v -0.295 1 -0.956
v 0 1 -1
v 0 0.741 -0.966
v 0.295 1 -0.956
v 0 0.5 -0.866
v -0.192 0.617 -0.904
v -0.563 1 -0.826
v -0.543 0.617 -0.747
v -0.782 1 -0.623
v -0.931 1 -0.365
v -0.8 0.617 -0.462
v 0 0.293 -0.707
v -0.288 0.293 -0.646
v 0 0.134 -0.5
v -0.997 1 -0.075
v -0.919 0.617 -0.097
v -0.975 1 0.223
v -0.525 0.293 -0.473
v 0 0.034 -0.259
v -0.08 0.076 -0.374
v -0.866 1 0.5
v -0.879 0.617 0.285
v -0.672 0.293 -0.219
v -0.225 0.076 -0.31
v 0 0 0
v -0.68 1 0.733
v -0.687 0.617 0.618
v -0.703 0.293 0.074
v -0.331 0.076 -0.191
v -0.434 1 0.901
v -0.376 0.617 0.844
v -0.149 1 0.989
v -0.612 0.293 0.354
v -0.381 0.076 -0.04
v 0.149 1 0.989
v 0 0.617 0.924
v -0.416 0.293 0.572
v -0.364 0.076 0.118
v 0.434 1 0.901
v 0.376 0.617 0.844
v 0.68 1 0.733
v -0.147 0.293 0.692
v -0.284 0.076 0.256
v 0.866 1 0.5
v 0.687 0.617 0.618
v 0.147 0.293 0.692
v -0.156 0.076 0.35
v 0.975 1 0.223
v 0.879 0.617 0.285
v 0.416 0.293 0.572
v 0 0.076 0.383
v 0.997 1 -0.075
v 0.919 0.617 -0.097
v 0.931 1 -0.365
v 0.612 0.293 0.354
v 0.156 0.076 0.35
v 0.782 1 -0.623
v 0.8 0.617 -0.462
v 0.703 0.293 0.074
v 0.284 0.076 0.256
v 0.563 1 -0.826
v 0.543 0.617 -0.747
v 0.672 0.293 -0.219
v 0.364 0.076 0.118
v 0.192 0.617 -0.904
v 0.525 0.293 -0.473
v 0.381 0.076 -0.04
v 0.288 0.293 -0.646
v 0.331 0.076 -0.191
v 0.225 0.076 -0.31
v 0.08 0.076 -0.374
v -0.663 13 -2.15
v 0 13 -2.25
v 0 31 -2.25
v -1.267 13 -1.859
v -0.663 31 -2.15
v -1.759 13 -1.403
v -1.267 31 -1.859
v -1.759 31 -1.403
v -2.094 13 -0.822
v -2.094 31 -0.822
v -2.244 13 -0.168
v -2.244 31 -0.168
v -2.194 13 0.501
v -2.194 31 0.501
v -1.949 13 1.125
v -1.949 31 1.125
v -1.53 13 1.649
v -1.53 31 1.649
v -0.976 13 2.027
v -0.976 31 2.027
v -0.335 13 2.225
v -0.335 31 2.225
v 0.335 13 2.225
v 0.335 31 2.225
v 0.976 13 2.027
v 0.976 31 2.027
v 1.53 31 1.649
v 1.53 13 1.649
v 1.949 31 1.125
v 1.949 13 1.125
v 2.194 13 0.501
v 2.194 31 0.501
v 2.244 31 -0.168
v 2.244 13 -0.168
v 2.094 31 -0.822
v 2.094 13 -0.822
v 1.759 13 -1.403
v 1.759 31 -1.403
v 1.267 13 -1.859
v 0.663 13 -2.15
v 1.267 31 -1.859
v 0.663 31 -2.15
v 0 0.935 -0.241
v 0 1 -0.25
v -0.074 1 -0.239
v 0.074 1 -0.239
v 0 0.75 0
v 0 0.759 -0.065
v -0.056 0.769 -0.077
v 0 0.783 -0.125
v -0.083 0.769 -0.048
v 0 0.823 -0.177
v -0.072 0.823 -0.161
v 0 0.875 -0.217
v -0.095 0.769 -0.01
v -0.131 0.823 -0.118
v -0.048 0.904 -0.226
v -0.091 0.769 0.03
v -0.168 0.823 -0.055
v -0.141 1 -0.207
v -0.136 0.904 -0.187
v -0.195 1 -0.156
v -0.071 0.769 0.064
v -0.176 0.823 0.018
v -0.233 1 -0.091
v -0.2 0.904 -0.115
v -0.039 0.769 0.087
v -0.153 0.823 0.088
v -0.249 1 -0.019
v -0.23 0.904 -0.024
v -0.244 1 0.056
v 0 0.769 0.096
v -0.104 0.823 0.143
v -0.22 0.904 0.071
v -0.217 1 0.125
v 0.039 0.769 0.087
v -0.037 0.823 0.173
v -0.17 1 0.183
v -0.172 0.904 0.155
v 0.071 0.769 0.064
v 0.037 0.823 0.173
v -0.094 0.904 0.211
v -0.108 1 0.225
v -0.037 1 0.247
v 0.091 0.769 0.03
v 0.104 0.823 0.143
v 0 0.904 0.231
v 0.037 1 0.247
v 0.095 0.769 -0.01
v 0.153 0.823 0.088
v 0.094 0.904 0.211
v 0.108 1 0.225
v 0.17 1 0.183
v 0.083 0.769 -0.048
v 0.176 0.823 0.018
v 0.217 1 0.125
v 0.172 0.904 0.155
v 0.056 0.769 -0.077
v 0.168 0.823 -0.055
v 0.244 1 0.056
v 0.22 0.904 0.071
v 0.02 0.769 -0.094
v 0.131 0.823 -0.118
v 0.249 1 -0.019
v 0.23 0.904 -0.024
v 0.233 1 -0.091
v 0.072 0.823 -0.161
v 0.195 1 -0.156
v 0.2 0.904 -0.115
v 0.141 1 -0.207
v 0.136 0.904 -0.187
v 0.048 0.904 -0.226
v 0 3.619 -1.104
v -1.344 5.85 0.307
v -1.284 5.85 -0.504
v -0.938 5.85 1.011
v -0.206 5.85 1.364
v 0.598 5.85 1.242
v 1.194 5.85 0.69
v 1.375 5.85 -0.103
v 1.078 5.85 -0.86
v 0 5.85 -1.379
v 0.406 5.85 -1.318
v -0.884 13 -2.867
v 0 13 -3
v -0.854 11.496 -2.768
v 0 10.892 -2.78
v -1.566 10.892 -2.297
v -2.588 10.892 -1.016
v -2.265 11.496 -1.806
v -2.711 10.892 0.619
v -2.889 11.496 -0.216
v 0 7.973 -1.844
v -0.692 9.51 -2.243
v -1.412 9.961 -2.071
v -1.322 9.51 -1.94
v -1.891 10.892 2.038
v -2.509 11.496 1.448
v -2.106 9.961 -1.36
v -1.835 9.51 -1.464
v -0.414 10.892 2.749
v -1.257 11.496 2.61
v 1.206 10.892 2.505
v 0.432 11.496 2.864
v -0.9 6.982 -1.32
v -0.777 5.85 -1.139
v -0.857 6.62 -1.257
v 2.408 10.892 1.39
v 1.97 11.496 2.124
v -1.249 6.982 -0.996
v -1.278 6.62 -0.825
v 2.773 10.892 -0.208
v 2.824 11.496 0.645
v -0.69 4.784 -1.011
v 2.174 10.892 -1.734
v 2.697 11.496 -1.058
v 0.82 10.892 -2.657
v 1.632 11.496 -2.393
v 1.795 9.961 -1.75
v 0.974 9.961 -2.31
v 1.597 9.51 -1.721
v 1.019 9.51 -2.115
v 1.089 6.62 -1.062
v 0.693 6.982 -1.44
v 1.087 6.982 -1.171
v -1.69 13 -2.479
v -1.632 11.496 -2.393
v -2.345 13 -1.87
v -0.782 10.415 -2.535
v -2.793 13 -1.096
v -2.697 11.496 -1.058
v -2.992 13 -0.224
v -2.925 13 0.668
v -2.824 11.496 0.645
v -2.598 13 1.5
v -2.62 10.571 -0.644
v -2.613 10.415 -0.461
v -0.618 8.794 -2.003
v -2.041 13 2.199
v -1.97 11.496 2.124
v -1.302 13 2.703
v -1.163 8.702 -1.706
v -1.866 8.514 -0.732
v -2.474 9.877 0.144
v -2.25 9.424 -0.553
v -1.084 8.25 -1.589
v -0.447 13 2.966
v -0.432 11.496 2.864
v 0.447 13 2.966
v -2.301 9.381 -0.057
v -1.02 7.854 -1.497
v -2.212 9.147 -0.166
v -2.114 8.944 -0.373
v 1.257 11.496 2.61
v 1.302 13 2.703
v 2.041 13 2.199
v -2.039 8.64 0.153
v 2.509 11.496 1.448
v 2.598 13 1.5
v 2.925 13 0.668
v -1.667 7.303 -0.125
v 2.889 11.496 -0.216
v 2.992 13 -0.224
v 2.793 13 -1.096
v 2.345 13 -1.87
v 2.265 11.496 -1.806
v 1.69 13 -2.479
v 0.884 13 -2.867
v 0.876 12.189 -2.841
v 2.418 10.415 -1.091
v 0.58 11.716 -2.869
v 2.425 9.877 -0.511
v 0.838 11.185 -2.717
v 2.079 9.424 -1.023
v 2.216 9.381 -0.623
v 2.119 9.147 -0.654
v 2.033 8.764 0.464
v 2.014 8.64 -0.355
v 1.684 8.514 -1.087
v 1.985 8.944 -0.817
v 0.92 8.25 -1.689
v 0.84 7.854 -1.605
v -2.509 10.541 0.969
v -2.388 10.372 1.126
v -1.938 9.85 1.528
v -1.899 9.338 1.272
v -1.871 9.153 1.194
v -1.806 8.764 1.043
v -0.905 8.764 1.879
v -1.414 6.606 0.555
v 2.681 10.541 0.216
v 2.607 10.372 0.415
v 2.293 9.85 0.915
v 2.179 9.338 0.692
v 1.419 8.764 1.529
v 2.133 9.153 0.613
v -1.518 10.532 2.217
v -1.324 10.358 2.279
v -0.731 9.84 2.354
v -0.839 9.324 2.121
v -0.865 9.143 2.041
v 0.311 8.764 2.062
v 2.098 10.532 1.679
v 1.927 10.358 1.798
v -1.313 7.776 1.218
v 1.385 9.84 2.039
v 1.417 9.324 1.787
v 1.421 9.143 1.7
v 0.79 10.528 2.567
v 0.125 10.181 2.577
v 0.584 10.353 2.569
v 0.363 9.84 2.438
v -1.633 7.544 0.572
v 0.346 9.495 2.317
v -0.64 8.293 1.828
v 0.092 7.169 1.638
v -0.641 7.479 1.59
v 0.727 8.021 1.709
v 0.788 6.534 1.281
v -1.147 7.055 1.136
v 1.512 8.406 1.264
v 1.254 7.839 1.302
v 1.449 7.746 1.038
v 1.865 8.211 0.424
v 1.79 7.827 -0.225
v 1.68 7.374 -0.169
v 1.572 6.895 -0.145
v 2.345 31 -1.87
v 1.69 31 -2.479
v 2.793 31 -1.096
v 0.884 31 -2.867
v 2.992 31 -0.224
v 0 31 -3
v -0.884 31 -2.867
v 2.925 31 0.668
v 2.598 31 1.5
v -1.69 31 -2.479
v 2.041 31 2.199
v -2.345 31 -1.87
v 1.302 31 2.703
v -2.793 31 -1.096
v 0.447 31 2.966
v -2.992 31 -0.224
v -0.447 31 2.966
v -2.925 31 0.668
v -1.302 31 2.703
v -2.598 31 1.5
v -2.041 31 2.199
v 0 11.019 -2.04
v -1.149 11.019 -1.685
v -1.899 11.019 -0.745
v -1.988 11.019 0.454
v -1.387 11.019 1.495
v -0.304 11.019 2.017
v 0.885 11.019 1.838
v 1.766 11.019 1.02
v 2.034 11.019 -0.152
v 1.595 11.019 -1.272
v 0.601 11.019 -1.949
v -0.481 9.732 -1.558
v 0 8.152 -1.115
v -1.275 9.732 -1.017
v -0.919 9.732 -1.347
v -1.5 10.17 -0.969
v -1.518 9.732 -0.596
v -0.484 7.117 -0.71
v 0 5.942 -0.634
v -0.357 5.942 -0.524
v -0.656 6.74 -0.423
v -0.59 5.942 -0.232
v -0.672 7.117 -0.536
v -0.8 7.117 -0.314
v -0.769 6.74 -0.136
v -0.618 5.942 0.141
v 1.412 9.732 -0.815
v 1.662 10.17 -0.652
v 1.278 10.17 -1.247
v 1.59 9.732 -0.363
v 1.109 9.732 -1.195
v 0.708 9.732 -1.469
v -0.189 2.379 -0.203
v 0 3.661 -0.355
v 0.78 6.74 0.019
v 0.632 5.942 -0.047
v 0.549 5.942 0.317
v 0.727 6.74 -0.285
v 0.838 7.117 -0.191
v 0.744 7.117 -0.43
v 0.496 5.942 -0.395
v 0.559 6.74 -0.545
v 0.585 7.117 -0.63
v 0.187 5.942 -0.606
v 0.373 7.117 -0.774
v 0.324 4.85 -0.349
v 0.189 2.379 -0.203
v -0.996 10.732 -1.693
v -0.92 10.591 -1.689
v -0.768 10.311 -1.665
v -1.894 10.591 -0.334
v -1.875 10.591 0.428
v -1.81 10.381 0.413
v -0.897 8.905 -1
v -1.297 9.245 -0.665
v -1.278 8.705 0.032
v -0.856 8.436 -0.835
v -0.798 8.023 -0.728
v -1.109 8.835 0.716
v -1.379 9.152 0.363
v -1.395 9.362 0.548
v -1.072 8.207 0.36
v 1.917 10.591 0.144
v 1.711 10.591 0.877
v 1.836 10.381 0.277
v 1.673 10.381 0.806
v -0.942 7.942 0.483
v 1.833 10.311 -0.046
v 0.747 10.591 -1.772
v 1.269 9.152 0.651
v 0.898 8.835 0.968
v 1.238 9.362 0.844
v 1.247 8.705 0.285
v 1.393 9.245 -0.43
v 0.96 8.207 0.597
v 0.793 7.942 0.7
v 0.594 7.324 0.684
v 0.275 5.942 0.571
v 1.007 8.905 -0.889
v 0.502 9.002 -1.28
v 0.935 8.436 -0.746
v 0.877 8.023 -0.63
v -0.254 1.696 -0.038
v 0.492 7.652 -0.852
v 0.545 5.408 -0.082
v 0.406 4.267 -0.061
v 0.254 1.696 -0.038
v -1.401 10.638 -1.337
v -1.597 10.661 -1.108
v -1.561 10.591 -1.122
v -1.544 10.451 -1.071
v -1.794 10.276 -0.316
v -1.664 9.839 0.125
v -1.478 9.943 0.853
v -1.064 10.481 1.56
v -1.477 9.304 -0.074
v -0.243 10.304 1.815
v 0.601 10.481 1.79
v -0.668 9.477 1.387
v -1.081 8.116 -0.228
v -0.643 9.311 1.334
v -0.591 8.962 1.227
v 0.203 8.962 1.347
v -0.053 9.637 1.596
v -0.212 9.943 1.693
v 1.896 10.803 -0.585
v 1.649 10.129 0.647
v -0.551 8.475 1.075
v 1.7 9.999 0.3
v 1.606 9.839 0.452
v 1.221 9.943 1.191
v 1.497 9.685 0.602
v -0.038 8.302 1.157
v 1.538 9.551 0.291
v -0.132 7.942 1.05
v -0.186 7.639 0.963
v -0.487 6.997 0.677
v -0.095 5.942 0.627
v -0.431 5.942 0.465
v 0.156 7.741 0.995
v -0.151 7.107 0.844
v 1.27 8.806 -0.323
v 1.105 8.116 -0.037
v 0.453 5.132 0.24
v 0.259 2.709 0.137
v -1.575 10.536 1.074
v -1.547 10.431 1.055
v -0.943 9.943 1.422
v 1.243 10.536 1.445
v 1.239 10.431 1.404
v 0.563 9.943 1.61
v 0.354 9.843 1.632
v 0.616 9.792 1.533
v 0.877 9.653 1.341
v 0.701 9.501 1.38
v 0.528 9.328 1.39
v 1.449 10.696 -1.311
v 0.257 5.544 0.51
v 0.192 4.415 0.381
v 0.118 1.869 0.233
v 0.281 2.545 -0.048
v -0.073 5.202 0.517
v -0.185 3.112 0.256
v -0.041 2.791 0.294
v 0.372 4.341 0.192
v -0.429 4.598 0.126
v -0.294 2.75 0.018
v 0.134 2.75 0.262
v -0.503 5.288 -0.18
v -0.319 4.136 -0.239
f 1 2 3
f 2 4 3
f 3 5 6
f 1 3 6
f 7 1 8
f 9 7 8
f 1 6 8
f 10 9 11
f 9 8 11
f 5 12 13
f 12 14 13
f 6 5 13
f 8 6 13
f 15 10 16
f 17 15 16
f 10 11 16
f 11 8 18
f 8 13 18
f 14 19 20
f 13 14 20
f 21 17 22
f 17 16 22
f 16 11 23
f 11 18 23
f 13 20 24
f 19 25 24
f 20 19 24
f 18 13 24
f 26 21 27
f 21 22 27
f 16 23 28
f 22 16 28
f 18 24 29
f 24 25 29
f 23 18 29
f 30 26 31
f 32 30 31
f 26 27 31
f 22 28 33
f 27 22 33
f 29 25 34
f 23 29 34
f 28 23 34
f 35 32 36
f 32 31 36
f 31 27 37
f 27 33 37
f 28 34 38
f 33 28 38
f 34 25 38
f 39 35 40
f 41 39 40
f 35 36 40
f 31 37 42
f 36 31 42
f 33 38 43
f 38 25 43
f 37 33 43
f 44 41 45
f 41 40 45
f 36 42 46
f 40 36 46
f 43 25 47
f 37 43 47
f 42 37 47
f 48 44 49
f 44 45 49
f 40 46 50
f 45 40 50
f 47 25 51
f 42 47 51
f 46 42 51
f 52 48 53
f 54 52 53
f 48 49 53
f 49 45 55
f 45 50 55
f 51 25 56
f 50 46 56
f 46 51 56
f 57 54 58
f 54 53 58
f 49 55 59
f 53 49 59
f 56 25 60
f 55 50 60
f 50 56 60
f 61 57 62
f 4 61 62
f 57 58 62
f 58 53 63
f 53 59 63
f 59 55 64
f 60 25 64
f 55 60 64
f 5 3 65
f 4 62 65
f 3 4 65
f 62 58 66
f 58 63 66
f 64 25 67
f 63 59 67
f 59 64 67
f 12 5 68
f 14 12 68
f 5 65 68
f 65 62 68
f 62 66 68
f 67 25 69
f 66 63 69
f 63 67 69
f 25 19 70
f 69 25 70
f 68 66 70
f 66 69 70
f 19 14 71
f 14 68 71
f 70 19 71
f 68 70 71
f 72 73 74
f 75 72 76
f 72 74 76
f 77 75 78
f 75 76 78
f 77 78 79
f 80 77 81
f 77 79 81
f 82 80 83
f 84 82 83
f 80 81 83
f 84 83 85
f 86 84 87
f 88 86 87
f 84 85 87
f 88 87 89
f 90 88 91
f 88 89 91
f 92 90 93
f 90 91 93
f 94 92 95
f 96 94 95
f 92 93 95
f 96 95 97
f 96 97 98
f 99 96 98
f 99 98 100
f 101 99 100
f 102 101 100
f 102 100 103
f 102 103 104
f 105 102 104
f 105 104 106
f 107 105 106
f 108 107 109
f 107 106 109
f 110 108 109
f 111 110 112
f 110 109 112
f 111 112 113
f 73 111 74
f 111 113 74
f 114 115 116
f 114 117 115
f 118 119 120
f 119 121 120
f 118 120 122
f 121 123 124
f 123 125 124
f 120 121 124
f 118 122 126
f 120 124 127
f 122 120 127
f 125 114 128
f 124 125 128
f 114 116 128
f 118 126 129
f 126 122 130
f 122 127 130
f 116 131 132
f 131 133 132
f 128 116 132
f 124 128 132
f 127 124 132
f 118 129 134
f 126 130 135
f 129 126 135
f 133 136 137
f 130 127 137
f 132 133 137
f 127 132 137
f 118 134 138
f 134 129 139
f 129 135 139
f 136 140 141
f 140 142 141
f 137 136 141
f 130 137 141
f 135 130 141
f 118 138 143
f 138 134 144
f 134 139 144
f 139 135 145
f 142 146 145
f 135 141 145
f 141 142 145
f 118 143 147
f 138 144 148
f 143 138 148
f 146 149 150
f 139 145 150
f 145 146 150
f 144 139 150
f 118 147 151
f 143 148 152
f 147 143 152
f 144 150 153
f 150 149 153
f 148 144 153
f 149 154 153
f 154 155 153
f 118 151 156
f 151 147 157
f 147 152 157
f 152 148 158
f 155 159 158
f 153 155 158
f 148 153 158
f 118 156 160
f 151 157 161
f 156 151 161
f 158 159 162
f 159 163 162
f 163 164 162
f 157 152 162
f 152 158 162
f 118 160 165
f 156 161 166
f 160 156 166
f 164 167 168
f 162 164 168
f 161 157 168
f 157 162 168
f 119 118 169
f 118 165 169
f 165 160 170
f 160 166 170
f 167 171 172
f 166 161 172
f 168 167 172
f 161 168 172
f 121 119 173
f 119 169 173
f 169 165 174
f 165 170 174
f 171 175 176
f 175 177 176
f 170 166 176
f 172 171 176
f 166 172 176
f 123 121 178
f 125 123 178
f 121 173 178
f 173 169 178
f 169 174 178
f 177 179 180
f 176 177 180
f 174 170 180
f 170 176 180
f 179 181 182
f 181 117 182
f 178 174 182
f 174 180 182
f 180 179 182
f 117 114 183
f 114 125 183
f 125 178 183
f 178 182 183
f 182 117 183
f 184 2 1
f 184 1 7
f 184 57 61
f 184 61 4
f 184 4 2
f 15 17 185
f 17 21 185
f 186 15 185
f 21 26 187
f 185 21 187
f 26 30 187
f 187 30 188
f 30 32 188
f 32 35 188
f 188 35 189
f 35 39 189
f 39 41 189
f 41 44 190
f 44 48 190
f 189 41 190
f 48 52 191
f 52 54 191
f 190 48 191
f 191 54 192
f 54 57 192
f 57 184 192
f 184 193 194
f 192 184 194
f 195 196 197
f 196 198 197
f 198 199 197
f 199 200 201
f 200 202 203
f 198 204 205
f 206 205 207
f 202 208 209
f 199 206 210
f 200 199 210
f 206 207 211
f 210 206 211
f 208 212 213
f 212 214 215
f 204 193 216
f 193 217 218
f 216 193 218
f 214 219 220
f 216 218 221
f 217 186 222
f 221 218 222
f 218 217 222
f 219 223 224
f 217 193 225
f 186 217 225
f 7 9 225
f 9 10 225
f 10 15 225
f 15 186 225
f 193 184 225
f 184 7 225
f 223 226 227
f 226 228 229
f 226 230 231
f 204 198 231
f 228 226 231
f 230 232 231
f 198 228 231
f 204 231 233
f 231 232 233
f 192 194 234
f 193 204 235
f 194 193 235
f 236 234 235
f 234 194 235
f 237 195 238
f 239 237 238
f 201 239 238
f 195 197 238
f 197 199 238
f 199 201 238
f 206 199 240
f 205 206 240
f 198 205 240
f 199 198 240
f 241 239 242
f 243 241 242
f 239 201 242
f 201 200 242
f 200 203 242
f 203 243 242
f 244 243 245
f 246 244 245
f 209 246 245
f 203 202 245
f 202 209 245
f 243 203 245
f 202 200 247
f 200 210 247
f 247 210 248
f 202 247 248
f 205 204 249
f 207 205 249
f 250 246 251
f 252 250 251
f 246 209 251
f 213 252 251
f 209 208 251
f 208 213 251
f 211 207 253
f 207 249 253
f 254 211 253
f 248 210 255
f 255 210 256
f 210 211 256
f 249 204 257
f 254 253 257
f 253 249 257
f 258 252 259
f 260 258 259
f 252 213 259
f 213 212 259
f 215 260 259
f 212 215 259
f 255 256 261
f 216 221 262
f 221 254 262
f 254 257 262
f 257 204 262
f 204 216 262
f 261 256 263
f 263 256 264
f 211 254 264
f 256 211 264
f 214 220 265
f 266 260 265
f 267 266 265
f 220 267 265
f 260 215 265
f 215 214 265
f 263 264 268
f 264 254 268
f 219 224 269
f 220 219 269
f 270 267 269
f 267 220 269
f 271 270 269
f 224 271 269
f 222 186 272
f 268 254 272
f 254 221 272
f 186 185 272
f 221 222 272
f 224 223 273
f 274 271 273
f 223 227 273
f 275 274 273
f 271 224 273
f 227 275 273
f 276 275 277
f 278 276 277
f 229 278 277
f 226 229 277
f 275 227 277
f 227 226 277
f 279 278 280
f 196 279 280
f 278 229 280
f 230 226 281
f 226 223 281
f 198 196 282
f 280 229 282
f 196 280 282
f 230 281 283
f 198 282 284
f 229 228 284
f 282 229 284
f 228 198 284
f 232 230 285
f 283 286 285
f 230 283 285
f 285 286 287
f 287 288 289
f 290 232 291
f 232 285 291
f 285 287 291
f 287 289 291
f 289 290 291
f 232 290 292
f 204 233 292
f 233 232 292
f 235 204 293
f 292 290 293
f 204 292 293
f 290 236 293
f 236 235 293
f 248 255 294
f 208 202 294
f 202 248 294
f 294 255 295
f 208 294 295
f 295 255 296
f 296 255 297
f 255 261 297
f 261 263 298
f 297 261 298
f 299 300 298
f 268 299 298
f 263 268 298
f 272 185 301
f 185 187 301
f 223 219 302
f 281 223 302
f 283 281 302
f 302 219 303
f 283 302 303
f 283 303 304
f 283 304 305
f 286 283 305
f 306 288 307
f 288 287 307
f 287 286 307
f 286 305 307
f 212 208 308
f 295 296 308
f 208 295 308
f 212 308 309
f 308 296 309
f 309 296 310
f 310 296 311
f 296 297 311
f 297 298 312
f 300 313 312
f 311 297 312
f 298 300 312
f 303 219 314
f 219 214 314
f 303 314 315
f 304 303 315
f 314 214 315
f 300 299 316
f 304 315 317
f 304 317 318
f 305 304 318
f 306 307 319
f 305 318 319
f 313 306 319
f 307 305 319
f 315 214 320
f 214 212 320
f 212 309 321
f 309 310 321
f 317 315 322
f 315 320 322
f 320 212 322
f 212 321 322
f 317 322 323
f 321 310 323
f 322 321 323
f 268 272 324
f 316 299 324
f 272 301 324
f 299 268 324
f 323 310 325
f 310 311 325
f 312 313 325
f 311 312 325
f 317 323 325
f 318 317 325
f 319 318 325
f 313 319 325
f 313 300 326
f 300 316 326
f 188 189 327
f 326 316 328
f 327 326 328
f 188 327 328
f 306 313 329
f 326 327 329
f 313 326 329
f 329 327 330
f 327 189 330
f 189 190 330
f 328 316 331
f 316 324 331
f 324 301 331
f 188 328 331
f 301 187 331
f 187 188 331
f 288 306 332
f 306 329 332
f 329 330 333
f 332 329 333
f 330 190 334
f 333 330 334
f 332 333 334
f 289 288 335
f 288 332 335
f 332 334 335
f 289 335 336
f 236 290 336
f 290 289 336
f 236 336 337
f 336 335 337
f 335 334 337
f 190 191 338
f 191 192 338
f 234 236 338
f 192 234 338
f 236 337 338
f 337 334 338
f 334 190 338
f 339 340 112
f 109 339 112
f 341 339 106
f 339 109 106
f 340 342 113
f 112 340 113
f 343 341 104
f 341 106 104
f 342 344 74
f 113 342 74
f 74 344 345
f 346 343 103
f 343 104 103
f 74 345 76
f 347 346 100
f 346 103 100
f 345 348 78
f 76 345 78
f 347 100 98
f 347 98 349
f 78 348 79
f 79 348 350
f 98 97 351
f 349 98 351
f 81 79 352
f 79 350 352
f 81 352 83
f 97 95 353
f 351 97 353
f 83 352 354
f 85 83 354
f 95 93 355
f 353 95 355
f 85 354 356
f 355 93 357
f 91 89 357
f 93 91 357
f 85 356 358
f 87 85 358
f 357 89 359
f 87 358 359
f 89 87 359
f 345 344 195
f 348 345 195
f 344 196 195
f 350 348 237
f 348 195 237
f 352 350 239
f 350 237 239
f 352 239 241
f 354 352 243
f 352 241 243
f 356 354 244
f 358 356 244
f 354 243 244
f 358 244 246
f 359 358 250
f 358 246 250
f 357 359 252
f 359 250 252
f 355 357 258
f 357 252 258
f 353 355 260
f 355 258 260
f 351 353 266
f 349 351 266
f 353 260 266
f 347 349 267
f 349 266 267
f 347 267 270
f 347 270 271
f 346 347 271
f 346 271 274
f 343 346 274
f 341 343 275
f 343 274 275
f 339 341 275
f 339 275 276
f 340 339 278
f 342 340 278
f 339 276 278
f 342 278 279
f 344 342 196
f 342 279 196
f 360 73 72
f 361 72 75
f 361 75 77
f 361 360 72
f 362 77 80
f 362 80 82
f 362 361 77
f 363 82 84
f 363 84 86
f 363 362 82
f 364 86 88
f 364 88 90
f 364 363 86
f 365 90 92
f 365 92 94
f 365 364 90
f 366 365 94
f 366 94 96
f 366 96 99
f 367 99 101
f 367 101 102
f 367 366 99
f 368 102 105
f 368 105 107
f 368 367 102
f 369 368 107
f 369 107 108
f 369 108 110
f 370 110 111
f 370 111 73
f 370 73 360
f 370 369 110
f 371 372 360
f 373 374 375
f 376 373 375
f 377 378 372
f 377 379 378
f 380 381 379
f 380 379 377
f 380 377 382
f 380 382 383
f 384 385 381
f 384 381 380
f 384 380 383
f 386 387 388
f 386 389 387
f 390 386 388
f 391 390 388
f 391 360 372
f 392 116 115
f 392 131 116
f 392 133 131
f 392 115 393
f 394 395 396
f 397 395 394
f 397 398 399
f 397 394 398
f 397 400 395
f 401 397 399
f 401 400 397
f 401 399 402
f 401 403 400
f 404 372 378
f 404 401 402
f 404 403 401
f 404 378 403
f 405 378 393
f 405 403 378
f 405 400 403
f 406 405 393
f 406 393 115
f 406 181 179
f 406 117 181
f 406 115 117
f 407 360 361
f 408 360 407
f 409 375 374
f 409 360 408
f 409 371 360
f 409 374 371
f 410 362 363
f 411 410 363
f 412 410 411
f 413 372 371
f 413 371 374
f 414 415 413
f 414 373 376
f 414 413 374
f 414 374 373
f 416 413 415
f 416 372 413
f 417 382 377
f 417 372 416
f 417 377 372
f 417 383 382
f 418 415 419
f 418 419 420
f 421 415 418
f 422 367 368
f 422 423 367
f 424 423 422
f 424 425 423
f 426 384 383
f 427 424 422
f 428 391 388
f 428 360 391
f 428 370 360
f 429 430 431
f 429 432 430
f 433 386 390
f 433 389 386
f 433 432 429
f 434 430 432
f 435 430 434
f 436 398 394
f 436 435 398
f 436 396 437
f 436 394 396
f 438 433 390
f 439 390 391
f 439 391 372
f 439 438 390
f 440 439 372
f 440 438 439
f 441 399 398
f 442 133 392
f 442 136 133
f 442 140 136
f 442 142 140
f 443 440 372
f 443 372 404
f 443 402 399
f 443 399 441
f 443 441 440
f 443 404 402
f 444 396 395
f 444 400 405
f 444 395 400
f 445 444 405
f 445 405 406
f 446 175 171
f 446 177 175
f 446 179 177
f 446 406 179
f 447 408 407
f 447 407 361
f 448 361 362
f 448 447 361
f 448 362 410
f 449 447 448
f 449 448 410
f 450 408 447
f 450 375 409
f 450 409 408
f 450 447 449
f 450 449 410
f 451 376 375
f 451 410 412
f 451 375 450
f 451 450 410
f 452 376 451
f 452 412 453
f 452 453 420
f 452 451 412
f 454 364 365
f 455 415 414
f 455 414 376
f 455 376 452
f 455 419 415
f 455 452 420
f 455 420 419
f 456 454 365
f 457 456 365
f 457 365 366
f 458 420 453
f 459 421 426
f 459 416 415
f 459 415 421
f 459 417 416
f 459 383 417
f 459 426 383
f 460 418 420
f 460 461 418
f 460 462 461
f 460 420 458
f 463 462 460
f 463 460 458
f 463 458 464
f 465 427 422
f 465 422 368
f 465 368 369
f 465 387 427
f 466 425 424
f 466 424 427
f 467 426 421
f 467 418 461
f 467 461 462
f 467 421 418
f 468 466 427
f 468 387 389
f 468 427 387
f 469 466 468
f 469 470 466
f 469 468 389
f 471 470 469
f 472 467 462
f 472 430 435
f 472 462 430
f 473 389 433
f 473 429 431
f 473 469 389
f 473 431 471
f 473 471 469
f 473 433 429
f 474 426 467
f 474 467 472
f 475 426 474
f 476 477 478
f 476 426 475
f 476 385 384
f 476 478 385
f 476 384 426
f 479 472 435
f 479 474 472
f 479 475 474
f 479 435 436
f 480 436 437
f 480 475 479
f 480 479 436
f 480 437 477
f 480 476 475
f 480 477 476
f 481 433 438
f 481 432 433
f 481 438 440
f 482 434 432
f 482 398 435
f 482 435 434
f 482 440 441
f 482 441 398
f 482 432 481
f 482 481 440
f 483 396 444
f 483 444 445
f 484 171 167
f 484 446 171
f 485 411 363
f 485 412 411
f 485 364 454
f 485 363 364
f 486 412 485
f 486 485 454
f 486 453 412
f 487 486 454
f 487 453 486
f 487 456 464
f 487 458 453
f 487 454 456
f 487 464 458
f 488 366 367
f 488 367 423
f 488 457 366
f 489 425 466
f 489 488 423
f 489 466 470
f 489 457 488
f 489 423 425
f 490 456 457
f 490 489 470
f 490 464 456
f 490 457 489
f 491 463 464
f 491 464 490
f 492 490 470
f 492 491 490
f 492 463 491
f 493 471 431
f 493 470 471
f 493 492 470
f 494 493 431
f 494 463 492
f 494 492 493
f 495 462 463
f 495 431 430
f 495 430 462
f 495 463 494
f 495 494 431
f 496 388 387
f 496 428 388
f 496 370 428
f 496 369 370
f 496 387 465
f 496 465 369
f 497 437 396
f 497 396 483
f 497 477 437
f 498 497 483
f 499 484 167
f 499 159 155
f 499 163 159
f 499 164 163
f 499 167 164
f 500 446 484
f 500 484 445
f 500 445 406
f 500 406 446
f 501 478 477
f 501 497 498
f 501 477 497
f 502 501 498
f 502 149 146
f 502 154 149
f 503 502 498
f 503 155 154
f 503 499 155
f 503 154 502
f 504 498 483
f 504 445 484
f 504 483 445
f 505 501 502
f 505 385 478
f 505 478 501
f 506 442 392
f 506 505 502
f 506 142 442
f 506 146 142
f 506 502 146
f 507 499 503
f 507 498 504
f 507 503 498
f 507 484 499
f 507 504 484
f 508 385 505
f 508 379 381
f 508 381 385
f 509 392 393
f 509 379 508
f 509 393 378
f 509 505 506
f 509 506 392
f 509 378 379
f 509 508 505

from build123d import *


with BuildPart() as part:
    # Esquisse1 → Révolution1 (revolve)
    with BuildSketch(Plane.XY, mode=Mode.PRIVATE) as r_volution1_sk:
        with BuildLine():
            Line((3, 31), (3, 13))
            add(Edge.make_bspline(
                [(3, 13), (3, 10.828758266), (1.909740875, 9.139005261), (1, 4.312648173), (1, 1)],
                knots=[0, 0, 0, 0, 0.47748099, 1, 1, 1, 1], degree=3))
            ThreePointArc((1, 1), (0.707106781, 0.292893219), (0, 0))
            Line((0, 0), (0, 0.75))
            ThreePointArc((0, 0.75), (0.176776695, 0.823223305), (0.25, 1))
            add(Edge.make_bspline(
                [(2.25, 13), (2.25, 12.871737196), (2.245787574, 12.606951452), (2.222038955, 12.143851429), (2.166520076, 11.631917095), (2.066483378, 11.10563901), (1.895459566, 10.465643066), (1.614449871, 9.691395741), (1.208823224, 8.54637983), (0.833436633, 7.090662144), (0.520883429, 5.357160432), (0.341470293, 3.671860451), (0.263896436, 2.196984926), (0.25, 1.39355257), (0.25, 1)],
                knots=[0, 0, 0, 0, 0.03125, 0.0625, 0.125, 0.1875, 0.25, 0.375, 0.5, 0.625, 0.75, 0.875, 0.9375, 1, 1, 1, 1], degree=3))
            Line((2.25, 13), (2.25, 31))
            Line((2.25, 31), (3, 31))
        make_face()
    revolve(r_volution1_sk.sketch.rotate(Axis((0, 0, 0), (0, 1, 0)), 90), axis=Axis((0, 0, 0), (0, 1, 0)))


solid = part.part
